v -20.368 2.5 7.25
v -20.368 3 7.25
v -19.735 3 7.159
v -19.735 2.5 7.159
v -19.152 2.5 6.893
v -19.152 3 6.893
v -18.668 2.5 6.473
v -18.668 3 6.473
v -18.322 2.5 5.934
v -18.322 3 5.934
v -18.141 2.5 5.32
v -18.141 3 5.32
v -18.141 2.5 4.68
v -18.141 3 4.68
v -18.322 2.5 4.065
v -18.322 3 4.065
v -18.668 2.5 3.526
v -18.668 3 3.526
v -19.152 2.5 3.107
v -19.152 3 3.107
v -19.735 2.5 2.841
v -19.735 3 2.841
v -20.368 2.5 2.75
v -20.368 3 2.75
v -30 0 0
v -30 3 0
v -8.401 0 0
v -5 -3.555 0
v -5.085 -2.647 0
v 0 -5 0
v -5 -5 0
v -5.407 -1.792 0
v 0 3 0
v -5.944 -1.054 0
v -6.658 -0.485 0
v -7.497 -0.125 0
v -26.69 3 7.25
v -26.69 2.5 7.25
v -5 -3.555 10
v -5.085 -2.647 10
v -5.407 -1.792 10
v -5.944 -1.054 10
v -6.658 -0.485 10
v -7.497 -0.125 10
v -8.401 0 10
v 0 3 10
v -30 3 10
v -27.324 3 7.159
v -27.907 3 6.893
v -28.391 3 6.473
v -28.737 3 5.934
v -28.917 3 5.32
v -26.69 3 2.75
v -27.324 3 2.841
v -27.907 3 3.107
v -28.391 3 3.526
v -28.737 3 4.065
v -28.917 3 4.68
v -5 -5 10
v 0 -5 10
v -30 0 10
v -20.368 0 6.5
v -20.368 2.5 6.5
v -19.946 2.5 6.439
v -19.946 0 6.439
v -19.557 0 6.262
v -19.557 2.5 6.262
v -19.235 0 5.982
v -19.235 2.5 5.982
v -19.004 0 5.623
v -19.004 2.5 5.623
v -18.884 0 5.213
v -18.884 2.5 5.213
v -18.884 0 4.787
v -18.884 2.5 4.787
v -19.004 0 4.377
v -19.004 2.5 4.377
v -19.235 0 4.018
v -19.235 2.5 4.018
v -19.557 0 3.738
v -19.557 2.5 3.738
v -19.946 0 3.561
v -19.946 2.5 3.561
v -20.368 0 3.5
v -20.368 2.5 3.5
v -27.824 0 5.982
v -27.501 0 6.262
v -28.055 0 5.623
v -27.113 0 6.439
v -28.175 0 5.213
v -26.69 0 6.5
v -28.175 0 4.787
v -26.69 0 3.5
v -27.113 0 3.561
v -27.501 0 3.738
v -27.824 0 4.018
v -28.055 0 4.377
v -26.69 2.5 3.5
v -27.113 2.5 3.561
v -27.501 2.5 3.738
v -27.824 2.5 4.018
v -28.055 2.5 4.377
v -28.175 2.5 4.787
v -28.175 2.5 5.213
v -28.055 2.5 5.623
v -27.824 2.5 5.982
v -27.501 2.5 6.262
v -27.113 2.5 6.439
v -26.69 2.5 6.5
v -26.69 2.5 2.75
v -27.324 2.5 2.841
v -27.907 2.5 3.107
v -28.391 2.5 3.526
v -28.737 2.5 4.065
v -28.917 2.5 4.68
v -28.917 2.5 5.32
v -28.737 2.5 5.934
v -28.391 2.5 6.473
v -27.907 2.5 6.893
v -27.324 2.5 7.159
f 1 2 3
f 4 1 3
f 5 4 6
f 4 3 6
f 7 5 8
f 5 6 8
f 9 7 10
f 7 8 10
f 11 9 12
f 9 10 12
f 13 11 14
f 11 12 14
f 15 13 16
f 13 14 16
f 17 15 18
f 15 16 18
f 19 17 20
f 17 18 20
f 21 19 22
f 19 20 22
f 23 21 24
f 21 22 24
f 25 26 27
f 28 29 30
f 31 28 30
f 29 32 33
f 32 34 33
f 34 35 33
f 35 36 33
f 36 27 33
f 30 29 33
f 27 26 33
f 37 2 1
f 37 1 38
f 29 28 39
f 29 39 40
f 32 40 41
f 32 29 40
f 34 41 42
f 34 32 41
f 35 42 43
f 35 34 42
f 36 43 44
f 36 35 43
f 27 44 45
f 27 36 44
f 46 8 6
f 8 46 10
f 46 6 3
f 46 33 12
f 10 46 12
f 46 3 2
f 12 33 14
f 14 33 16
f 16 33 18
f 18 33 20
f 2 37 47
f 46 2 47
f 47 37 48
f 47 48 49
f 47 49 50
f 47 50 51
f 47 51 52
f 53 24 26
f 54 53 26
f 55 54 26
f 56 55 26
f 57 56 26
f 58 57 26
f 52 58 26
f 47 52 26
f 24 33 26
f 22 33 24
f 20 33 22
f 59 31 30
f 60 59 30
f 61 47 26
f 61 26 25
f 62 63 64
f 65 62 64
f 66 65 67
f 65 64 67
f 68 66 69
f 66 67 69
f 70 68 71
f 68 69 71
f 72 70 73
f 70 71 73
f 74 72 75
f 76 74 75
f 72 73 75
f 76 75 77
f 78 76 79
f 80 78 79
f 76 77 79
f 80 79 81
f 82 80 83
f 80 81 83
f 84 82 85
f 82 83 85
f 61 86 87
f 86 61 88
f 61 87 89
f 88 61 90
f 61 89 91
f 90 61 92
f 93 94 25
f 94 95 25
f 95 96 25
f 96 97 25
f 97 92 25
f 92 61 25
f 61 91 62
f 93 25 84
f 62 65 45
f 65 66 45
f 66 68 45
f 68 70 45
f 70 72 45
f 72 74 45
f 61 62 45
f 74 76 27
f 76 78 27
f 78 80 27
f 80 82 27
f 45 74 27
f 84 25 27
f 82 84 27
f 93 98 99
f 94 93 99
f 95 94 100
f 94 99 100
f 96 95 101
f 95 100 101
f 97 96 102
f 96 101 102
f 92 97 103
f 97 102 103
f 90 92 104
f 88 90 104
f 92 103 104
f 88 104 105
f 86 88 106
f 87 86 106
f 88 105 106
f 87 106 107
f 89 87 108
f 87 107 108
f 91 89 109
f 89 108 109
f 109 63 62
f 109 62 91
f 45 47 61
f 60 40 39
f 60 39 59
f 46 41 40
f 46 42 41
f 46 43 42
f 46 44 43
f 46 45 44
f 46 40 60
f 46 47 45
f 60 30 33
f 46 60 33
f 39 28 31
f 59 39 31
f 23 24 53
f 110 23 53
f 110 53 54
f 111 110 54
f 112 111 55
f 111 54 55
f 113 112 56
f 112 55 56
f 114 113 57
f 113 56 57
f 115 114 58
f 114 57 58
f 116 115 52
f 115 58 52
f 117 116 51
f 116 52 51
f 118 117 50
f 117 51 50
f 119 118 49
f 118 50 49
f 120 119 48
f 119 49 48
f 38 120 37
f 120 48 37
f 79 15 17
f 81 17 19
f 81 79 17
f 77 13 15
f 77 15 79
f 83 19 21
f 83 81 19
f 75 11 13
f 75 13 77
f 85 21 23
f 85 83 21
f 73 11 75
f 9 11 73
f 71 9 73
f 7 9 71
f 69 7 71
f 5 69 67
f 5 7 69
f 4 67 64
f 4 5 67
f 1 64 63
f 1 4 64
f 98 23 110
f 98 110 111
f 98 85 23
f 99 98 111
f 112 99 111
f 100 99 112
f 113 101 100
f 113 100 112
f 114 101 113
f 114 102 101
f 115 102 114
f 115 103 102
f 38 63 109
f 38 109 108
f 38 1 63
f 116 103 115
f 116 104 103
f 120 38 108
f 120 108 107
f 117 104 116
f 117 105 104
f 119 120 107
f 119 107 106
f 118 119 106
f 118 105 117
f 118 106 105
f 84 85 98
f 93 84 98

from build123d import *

# Parameters (mm, degrees)
PAD_DEPTH       = 10
POCKET_DEPTH    = 8.001
POCKET001_DEPTH = 0.5


with BuildPart() as part:
    # Sketch → Pad (new body)
    with BuildSketch(Plane.XY):
        with BuildLine():
            Line((-30, 0), (-8.401164, 0))
            ThreePointArc((-5, -3.555465), (-5.94439, -1.054359), (-8.401164, 0))
            Line((-5, -3.555465), (-5, -5))
            Line((-5, -5), (0, -5))
            Line((0, -5), (0, 3))
            Line((0, 3), (-30, 3))
            Line((-30, 3), (-30, 0))
        make_face()
    extrude(amount=PAD_DEPTH)

    # Sketch001 (on DatumPlane) → Pocket (cut, through all)
    with BuildSketch(Plane(origin=(0, 3, 0), x_dir=(-1, 0, 0), z_dir=(0, 1, 0))):
        with BuildLine():
            ThreePointArc((20.368423, 6.5), (18.868423, 5), (20.368423, 3.5))
            Line((20.368423, 3.5), (26.690333, 3.5))
            ThreePointArc((26.690333, 3.5), (28.190333, 5), (26.690333, 6.5))
            Line((20.368423, 6.5), (26.690333, 6.5))
        make_face()
    extrude(amount=-POCKET_DEPTH, mode=Mode.SUBTRACT)

    # Sketch002 (on DatumPlane) → Pocket001 (cut)
    with BuildSketch(Plane(origin=(0, 3, 0), x_dir=(-1, 0, 0), z_dir=(0, 1, 0))):
        with BuildLine():
            ThreePointArc((20.368423, 7.249783), (18.118423, 4.999783), (20.368423, 2.749783))
            Line((20.368423, 2.749783), (26.690333, 2.749783))
            ThreePointArc((26.690333, 2.749783), (28.940333, 4.999783), (26.690333, 7.249783))
            Line((20.368423, 7.249783), (26.690333, 7.249783))
        make_face()
    extrude(amount=-POCKET001_DEPTH, mode=Mode.SUBTRACT)


solid = part.part
